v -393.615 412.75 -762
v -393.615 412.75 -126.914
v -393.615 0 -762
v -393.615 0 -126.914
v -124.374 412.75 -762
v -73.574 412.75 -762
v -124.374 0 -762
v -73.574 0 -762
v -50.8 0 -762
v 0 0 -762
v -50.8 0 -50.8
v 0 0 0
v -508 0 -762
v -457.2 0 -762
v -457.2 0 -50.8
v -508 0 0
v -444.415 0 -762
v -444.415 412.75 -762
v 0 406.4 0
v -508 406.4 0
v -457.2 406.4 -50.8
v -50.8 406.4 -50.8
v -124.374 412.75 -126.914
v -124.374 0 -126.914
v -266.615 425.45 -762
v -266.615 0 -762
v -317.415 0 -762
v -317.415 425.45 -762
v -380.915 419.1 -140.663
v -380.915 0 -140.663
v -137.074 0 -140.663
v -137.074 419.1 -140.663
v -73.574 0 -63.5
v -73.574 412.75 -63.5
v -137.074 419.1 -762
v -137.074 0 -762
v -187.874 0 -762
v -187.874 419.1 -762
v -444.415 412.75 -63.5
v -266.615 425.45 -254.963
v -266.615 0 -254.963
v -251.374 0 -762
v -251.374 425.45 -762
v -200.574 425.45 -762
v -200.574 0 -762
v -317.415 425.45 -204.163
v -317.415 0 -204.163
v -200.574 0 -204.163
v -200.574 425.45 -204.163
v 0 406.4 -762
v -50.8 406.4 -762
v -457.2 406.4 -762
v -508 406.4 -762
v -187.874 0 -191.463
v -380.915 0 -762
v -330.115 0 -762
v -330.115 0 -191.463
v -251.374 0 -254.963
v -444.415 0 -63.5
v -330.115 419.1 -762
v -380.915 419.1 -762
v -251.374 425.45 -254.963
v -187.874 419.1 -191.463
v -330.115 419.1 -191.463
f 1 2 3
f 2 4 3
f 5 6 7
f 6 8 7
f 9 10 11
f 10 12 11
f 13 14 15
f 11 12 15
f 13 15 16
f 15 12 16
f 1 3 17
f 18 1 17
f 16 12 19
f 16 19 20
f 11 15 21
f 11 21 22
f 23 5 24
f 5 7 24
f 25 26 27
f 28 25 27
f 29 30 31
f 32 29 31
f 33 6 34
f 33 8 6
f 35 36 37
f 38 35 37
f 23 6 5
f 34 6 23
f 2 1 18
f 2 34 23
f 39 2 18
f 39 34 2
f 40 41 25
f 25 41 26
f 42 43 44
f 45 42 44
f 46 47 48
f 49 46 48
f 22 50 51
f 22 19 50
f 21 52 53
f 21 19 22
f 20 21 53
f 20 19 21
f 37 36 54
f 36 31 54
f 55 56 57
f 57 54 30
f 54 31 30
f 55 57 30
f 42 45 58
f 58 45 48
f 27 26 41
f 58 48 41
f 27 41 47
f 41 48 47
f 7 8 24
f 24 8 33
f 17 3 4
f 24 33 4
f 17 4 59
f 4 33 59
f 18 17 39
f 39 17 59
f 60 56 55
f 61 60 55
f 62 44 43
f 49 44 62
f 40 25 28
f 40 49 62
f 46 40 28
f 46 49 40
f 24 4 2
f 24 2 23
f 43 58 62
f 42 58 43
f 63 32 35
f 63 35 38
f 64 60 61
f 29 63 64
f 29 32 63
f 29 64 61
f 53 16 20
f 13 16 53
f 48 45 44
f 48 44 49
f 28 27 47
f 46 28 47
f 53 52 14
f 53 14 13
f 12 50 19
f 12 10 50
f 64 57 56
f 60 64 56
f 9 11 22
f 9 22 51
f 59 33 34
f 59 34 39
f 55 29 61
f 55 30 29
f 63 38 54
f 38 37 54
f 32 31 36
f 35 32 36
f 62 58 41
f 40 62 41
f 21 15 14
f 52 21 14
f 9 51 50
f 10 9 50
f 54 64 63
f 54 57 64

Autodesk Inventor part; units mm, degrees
ref_plane "YZ Plane" through (0, 0, 0) normal (1, 0, 0) x (0, 1, 0)
ref_plane "XZ Plane" through (0, 0, 0) normal (0, 1, 0) x (-1, 0, 0)
ref_plane "XY Plane" through (0, 0, 0) normal (0, 0, 1) x (1, 0, 0)
sketch "Sketch1" plane through (0, 0, 0) normal (0, 1, 0) x (-1, 0, 0)
  line L0 (0, 0) -> (508, 0)
  line L1 (508, 0) -> (508, -50.8)
  line L2 (508, -50.8) -> (0, -50.8)
  line L3 (0, -50.8) -> (0, 0)
  line L4 (0, 0) -> (50.8, 0)
  line L5 (50.8, 0) -> (50.8, -762)
  line L6 (50.8, -762) -> (0, -762)
  line L7 (0, -762) -> (0, 0)
  line L8 (508, 0) -> (457.2, 0)
  line L9 (457.2, 0) -> (457.2, -762)
  line L10 (457.2, -762) -> (508, -762)
  line L11 (508, -762) -> (508, 0)
  line L12 (50.8, -762) -> (457.2, -762)
  line L13 (324.0208, -50.8) -> (324.0208, -63.5)
  line L14 (457.2, -242.977) -> (444.5, -242.977)
  line L15 (50.8, -225.2641) -> (63.5, -225.2641)
  dimension "d0" = 508
  dimension "d1" = 50.8
  dimension "d2" = 50.8
  dimension "d3" = 762
  dimension "d4" = 50.8
  dimension "d5" = 762
  dimension "d6" = 12.7
  dimension "d7" = 12.7
  dimension "d8" = 12.7
sketch "Sketch2" plane through (0, 0, 0) normal (0, 1, 0) x (-1, 0, 0)
  line L0 (444.4154, -126.9138) -> (394.1877, -126.9138)
  line L1 (73.5741, -107.6392) -> (73.5741, -94.9392)
  line L2 (50.8, -762) -> (457.2, -762) projected
  line L3 (324.0208, -50.8) -> (324.0208, -63.5) projected
  line L4 (444.4154, -126.9138) -> (73.5741, -126.9138)
  line L5 (73.5741, -126.9138) -> (73.5741, -63.5)
  line L6 (73.5741, -63.5) -> (444.4154, -63.5)
  line L7 (444.4154, -63.5) -> (444.4154, -126.9138)
  line L8 (73.5741, -762) -> (124.3741, -762)
  line L9 (124.3741, -762) -> (124.3741, -126.9138)
  line L10 (124.3741, -63.5) -> (73.5741, -63.5)
  line L11 (73.5741, -63.5) -> (73.5741, -762)
  line L12 (444.4154, -63.5) -> (393.6154, -63.5)
  line L13 (393.6154, -126.9138) -> (393.6154, -762)
  line L14 (393.6154, -762) -> (444.4154, -762)
  line L15 (444.4154, -762) -> (444.4154, -63.5)
  point P0 (0, 0)
  dimension "d31" = 50.8
  dimension "d32" = 50.8
sketch "Sketch3" plane through (0, 0, 0) normal (0, 1, 0) x (-1, 0, 0)
  line L0 (266.2128, -127.9629) -> (266.2128, -140.6629)
  line L1 (393.6154, -126.9138) -> (393.6154, -762) projected
  line L2 (124.3741, -762) -> (124.3741, -126.9138) projected
  line L3 (124.3741, -238.3365) -> (137.0741, -238.3365)
  line L4 (393.6154, -256.759) -> (380.9154, -256.759)
  line L5 (137.0741, -762) -> (187.8741, -762)
  line L6 (187.8741, -762) -> (187.8741, -140.6629)
  line L7 (187.8741, -140.6629) -> (137.0741, -140.6629)
  line L8 (137.0741, -140.6629) -> (137.0741, -762)
  line L9 (187.8741, -140.6629) -> (380.9154, -140.6629)
  line L10 (380.9154, -140.6629) -> (380.9154, -191.4629)
  line L11 (380.9154, -191.4629) -> (187.8741, -191.4629)
  line L12 (187.8741, -191.4629) -> (187.8741, -140.6629)
  line L13 (380.9154, -191.4629) -> (330.1154, -191.4629)
  line L14 (330.1154, -191.4629) -> (330.1154, -762)
  line L15 (330.1154, -762) -> (380.9154, -762)
  line L16 (380.9154, -762) -> (380.9154, -191.4629)
  line L17 (266.2128, -191.4629) -> (266.2128, -204.1629)
  line L18 (330.1154, -311.7256) -> (317.4154, -311.7256)
  line L19 (187.8741, -311.7256) -> (200.5741, -311.7256)
  line L20 (317.4154, -204.1629) -> (200.5741, -204.1629)
  line L21 (200.5741, -204.1629) -> (200.5741, -254.9629)
  line L22 (200.5741, -254.9629) -> (317.4154, -254.9629)
  line L23 (317.4154, -254.9629) -> (317.4154, -204.1629)
  line L24 (317.4154, -254.9629) -> (266.6154, -254.9629)
  line L25 (266.6154, -254.9629) -> (266.6154, -762)
  line L26 (266.6154, -762) -> (317.4154, -762)
  line L27 (317.4154, -762) -> (317.4154, -254.9629)
  line L28 (200.5741, -254.9629) -> (251.3741, -254.9629)
  line L29 (251.3741, -254.9629) -> (251.3741, -762)
  line L30 (251.3741, -762) -> (200.5741, -762)
  line L31 (200.5741, -762) -> (200.5741, -254.9629)
  point P0 (0, 0)
  dimension "d33" = 12.7
  dimension "d34" = 12.7
  dimension "d35" = 12.7
  dimension "d36" = 50.8
  dimension "d37" = 50.8
  dimension "d38" = 50.8
  dimension "d39" = 12.7
  dimension "d40" = 12.7
  dimension "d41" = 12.7
  dimension "d42" = 50.8
  dimension "d43" = 50.8
  dimension "d44" = 50.8
extrude "Extrusion1" add sketch "Sketch1" along normal blind 406.4 contours L0 L5 L2 L3 | L0 L9 L2 L5 | L2 L5 L6 L7 | L0 L1 L2 L9 | L2 L11 L10 L9
extrude "Extrusion2" add sketch "Sketch2" along normal blind 412.75 contours L15 L2 L13 L4 L0 | L0 L4 L5 L1 L6 L7 | L9 L2 L11 L4
extrude "Extrusion3" add sketch "Sketch3" along normal blind 419.1 contours L8 L7 L6 L5 | L6 L9 L10 L11 | L11 L16 L15 L14
extrude "Extrusion4" add sketch "Sketch3" along normal blind 425.45 contours L31 L22 L29 L30 | L21 L20 L23 L22 | L22 L27 L26 L25
properties part number "rectangle lift idea"
